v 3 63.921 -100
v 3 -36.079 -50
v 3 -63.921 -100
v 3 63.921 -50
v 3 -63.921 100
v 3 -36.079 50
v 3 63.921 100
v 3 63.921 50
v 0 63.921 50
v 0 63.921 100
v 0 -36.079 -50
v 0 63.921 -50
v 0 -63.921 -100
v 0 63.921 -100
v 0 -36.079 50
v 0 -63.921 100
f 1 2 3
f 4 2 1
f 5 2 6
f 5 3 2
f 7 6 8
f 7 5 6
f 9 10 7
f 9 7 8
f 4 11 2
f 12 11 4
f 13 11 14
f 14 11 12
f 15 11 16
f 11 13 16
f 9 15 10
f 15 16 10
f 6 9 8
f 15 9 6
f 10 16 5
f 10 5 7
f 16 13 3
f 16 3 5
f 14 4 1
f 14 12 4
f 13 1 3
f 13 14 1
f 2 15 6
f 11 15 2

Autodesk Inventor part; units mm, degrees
ref_plane "YZ Plane" through (0, 0, 0) normal (1, 0, 0) x (0, 1, 0)
ref_plane "XZ Plane" through (0, 0, 0) normal (0, 1, 0) x (-1, 0, 0)
ref_plane "XY Plane" through (0, 0, 0) normal (0, 0, 1) x (1, 0, 0)
sketch "Sketch1" plane through (0, 0, 0) normal (1, 0, 0) x (0, 1, 0)
  line L0 (-63.921, 100) -> (63.921, 100)
  line L1 (63.921, 100) -> (63.921, -100)
  line L2 (63.921, -100) -> (-63.921, -100)
  line L3 (-63.921, -100) -> (-63.921, 100)
  line L4 (-63.921, 100) -> (63.921, -100) construction
  line L5 (63.921, 100) -> (-63.921, -100) construction
  line L6 (63.921, 50) -> (-36.079, 50)
  line L7 (-36.079, 50) -> (-36.079, -50)
  line L8 (-36.079, -50) -> (63.921, -50)
  line L9 (63.921, -50) -> (63.921, 50)
  point P0 (0, 0)
  point P1 (63.921, -50)
  dimension "d0" = 200
  dimension "d1" = 127.842
  dimension "d2" = 100
  dimension "d3" = 100
  dimension "d4" = 50
extrude "Extrusion1" add sketch "Sketch1" along normal blind 3 contours L0 L1 L6 L7 L8 L2 L3
equation "\"d3\" = d2"
properties part number "WI-CoverRS3"
